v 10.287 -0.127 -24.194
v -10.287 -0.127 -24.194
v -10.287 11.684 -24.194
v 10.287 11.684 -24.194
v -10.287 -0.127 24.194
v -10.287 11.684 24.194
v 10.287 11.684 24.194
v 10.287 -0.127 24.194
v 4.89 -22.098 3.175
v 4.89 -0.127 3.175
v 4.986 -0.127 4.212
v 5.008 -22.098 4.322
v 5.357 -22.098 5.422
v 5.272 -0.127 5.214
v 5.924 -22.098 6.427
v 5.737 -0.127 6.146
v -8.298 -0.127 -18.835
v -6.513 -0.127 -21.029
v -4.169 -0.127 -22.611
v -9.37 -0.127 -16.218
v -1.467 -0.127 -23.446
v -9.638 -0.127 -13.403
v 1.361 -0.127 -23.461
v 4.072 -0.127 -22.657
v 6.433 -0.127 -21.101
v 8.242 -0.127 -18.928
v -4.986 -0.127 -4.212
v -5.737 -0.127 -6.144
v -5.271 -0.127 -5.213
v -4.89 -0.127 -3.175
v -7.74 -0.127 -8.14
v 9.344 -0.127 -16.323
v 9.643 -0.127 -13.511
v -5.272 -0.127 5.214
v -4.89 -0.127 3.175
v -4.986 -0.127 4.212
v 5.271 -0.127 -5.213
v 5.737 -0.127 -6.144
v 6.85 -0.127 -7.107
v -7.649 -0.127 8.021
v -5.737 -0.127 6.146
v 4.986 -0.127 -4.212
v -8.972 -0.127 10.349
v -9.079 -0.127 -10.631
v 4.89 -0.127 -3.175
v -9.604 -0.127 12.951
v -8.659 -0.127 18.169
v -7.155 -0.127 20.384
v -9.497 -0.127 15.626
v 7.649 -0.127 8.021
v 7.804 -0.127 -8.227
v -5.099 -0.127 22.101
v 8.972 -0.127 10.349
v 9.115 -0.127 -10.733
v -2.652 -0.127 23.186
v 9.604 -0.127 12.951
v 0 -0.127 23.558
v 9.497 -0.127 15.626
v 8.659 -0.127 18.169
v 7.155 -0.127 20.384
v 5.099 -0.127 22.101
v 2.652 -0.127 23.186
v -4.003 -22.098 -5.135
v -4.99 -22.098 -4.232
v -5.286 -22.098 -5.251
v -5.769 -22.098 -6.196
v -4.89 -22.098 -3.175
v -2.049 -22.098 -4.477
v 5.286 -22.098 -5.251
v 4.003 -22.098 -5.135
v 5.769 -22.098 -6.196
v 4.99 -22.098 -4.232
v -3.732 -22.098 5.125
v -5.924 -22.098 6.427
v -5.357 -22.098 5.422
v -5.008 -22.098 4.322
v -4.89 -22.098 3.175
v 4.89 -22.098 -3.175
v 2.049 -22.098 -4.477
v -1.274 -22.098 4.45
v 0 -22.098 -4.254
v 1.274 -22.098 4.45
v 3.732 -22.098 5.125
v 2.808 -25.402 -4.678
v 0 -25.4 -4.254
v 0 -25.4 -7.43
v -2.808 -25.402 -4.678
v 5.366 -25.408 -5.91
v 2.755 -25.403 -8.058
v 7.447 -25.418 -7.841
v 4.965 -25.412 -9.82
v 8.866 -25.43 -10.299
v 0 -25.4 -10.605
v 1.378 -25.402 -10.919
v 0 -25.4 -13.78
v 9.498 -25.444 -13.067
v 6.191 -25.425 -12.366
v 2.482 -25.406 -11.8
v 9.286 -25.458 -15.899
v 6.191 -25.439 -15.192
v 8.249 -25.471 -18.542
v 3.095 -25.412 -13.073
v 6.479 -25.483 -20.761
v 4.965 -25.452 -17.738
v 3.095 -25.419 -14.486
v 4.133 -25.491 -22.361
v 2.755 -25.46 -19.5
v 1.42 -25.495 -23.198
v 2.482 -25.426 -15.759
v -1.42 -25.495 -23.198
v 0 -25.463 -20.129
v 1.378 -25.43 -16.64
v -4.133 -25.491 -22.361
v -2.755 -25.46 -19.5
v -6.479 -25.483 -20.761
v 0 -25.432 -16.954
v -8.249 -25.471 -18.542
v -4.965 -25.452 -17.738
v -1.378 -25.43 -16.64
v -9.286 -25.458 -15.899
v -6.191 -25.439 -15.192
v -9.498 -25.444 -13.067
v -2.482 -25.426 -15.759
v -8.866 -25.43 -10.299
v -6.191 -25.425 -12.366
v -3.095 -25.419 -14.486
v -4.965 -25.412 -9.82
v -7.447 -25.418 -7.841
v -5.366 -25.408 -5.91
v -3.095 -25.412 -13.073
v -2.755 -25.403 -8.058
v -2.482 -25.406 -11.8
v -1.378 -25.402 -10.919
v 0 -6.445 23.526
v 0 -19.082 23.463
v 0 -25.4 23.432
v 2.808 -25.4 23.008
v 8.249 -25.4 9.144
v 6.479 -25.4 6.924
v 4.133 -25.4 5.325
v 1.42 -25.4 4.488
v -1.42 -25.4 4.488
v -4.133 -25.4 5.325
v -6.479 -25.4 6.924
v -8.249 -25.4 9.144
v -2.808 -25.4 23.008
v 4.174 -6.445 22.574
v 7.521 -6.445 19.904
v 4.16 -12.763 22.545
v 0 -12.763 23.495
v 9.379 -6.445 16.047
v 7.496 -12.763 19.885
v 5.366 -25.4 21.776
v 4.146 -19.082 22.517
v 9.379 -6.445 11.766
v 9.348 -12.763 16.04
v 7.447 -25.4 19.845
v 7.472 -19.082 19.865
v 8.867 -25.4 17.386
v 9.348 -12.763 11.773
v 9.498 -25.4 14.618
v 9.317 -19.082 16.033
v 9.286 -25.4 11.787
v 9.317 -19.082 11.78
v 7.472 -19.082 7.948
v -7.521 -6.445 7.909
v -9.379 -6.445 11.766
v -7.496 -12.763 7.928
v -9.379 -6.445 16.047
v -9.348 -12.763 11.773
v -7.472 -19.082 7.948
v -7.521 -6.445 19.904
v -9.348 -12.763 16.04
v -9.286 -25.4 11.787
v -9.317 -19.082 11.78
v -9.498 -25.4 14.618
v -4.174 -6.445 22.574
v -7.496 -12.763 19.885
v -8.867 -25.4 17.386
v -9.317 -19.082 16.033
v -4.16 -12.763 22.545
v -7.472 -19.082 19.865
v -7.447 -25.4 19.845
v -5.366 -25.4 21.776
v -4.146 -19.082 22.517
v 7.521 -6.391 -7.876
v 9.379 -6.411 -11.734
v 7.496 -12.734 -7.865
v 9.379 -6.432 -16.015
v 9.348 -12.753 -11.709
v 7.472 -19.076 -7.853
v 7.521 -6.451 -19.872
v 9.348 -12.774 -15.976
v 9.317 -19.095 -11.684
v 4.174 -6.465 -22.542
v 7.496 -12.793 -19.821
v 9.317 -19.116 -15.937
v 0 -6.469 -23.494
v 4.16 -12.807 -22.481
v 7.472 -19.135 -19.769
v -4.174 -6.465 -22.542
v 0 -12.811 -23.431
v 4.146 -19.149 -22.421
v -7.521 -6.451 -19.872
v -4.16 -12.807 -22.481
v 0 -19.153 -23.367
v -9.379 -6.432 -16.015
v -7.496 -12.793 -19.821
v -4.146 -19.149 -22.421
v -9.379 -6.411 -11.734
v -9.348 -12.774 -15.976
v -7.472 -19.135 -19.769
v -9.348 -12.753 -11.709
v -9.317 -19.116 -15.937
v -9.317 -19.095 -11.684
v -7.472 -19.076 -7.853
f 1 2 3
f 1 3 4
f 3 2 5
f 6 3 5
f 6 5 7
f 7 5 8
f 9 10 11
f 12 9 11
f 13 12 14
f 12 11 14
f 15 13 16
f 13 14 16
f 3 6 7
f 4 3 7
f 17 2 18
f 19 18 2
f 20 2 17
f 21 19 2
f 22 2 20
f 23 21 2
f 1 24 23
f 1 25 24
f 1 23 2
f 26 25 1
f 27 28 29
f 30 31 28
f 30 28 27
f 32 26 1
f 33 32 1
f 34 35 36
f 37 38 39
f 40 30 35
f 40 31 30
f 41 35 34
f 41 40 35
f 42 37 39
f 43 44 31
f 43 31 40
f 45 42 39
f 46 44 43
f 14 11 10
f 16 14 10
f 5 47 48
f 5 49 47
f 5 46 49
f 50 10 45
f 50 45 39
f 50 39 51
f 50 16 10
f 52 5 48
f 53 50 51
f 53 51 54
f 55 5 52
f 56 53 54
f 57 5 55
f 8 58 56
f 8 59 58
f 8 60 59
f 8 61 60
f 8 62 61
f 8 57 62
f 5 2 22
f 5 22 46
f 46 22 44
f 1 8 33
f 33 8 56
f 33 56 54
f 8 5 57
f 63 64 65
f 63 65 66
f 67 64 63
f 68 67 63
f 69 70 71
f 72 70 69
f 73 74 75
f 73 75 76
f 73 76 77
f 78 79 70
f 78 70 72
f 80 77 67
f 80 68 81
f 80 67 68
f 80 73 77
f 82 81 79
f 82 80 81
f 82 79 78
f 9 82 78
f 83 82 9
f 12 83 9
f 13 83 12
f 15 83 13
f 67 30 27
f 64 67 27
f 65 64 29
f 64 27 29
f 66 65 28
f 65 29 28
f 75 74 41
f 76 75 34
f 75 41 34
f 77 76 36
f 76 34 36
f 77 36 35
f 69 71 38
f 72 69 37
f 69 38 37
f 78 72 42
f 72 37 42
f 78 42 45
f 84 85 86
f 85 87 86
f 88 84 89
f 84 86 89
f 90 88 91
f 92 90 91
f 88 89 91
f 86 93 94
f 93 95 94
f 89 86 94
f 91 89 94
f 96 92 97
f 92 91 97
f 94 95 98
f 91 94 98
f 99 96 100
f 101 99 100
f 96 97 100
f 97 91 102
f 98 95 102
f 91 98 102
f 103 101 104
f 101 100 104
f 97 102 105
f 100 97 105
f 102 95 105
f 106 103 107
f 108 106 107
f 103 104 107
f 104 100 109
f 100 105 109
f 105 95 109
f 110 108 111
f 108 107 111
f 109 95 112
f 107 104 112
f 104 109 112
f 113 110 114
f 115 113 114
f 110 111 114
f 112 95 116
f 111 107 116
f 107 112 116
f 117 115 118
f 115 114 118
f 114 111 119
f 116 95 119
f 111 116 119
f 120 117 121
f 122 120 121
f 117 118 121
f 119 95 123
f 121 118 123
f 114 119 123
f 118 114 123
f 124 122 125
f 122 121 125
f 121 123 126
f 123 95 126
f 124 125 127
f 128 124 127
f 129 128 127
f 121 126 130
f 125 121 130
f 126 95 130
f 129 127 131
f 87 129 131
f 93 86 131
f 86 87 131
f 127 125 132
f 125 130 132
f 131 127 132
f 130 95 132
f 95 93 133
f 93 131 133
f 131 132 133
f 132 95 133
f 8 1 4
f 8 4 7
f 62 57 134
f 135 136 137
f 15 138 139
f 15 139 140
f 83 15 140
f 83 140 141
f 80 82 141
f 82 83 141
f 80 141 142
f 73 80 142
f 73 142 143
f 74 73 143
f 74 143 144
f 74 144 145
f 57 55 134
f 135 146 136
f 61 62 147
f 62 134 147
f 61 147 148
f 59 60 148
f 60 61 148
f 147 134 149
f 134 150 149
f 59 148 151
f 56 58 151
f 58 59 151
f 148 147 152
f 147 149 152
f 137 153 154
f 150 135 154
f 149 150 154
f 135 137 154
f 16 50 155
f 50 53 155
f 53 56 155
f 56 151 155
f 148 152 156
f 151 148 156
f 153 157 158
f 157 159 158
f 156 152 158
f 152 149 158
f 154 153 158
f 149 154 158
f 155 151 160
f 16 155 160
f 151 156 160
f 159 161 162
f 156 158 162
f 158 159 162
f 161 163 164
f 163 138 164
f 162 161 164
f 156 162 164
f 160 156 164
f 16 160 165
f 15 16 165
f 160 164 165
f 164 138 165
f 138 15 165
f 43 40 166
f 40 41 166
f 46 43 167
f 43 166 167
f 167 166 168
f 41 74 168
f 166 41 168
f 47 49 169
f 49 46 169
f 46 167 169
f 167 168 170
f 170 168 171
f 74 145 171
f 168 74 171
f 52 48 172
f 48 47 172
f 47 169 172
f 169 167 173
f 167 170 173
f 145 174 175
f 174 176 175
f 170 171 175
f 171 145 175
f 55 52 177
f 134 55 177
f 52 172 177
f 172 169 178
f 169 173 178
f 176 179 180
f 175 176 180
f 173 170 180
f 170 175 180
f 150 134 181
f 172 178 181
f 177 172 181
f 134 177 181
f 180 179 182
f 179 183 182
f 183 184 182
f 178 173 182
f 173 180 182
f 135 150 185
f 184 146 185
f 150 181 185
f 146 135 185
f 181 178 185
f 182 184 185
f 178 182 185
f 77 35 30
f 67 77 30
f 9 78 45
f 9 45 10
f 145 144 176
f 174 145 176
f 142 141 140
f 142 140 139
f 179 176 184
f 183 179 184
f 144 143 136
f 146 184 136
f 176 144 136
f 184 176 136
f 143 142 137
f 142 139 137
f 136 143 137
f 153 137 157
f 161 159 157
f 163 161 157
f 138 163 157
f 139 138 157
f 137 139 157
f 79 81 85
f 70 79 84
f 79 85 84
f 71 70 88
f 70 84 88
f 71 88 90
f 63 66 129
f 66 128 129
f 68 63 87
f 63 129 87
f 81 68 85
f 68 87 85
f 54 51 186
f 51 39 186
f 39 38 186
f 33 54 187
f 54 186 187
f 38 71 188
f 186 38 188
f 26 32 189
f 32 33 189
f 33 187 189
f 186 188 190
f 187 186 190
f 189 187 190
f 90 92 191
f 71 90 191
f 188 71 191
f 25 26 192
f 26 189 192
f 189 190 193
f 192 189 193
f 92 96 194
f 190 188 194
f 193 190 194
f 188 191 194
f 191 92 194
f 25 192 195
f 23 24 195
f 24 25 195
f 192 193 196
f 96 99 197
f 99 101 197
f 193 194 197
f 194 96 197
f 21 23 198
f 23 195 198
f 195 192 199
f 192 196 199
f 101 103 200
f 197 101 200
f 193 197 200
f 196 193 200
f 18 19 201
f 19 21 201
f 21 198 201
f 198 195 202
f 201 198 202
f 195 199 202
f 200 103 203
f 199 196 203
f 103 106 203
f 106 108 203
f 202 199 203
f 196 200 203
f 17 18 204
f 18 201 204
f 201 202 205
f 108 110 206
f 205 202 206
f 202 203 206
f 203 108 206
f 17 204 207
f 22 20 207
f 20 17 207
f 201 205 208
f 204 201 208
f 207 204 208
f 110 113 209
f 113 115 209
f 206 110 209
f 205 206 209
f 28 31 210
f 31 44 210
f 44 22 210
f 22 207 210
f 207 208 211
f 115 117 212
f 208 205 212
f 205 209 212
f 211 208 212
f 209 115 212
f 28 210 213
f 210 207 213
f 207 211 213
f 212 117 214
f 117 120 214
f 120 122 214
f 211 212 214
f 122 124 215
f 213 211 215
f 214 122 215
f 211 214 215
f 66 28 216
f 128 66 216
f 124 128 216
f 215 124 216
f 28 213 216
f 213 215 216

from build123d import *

# Parameters (mm, degrees)
F4_DEPTH = 22.098
F3_W     = 20.574
F3_H     = 48.387
F5_DEPTH = 0.127
F6_DEPTH = 11.557


with BuildPart() as f1:
    # F0 (on Right) → F1 (revolve)
    with BuildSketch(Plane.YZ):
        Polygon((-25.4, 23.4315), (-25.4, 13.9065), (0, 13.9065), (0, 23.5585), align=None)
    revolve(axis=Axis((0, -12.7, 13.9065), (0, 1, 0)))



with BuildPart() as f2:
    # F0 (on Right) → F2 (revolve)
    with BuildSketch(Plane.YZ):
        Polygon((0, -13.9065), (0, -4.2545), (-25.4, -4.2545), (-25.4, -13.7795), align=None)
    revolve(axis=Axis((0, -12.7, -13.843), (0, 0.9999875002, -0.0049999375)))


with BuildPart() as f1_1:
    add(f1.part)

    add(f2.part)  # F4 merges F2
    # F3 (on Front) → F4 (join)
    with BuildSketch(Plane.XZ):
        with BuildLine():
            Line((4.8895, -3.175), (4.8895, 3.175))
            ThreePointArc((4.8895, 3.175), (5.3288232031, 5.3549618496), (6.57820844, 7.1946017797))
            ThreePointArc((6.57820844, 7.1946017797), (0, 4.5085), (-6.57820844, 7.1946017797))
            ThreePointArc((-6.57820844, 7.1946017797), (-5.3288232031, 5.3549618496), (-4.8895, 3.175))
            Line((-4.8895, 3.175), (-4.8895, -3.175))
            ThreePointArc((-4.8895, -3.175), (-5.3287958737, -5.3547810515), (-6.5781006563, -7.1942548506))
            ThreePointArc((-6.5781006563, -7.1942548506), (0, -4.508258706), (6.5781006563, -7.1942548506))
            ThreePointArc((6.5781006563, -7.1942548506), (5.3287958737, -5.3547810515), (4.8895, -3.175))
        make_face()
    extrude(amount=F4_DEPTH)

    # F3 (on Front) → F5 (join, symmetric)
    with BuildSketch(Plane.XZ):
        Rectangle(F3_W, F3_H)
        with BuildLine():
            ThreePointArc((6.57820844, 7.1946017797), (5.3288232031, 5.3549618496), (4.8895, 3.175))
            Line((4.8895, 3.175), (4.8895, -3.175))
            ThreePointArc((4.8895, -3.175), (5.3287958737, -5.3547810515), (6.5781006563, -7.1942548506))
            ThreePointArc((6.5781006563, -7.1942548506), (8.6643924763, -10.2661066466), (9.398, -13.906258706))
            ThreePointArc((9.398, -13.906258706), (-3.6401520595, -22.5706511824), (-6.5781006563, -7.1942548506))
            ThreePointArc((-6.5781006563, -7.1942548506), (-5.3287958737, -5.3547810515), (-4.8895, -3.175))
            Line((-4.8895, -3.175), (-4.8895, 3.175))
            ThreePointArc((-4.8895, 3.175), (-5.3288232031, 5.3549618496), (-6.57820844, 7.1946017797))
            ThreePointArc((-6.57820844, 7.1946017797), (-3.6400824909, 22.5709217037), (9.398, 13.9065))
            ThreePointArc((9.398, 13.9065), (8.6644217037, 10.2664175091), (6.57820844, 7.1946017797))
        make_face(mode=Mode.SUBTRACT)
        with BuildLine():
            ThreePointArc((9.398, -13.906258706), (8.6643924763, -10.2661066466), (6.5781006563, -7.1942548506))
            ThreePointArc((6.5781006563, -7.1942548506), (0, -4.508258706), (-6.5781006563, -7.1942548506))
            ThreePointArc((-6.5781006563, -7.1942548506), (-3.6401520595, -22.5706511824), (9.398, -13.906258706))
        make_face()
        with BuildLine():
            Line((4.8895, -3.175), (4.8895, 3.175))
            ThreePointArc((4.8895, 3.175), (5.3288232031, 5.3549618496), (6.57820844, 7.1946017797))
            ThreePointArc((6.57820844, 7.1946017797), (0, 4.5085), (-6.57820844, 7.1946017797))
            ThreePointArc((-6.57820844, 7.1946017797), (-5.3288232031, 5.3549618496), (-4.8895, 3.175))
            Line((-4.8895, 3.175), (-4.8895, -3.175))
            ThreePointArc((-4.8895, -3.175), (-5.3287958737, -5.3547810515), (-6.5781006563, -7.1942548506))
            ThreePointArc((-6.5781006563, -7.1942548506), (0, -4.508258706), (6.5781006563, -7.1942548506))
            ThreePointArc((6.5781006563, -7.1942548506), (5.3287958737, -5.3547810515), (4.8895, -3.175))
        make_face()
        with BuildLine():
            ThreePointArc((-6.57820844, 7.1946017797), (0, 4.5085), (6.57820844, 7.1946017797))
            ThreePointArc((6.57820844, 7.1946017797), (8.6644217037, 10.2664175091), (9.398, 13.9065))
            ThreePointArc((9.398, 13.9065), (-3.6400824909, 22.5709217037), (-6.57820844, 7.1946017797))
        make_face()
    extrude(amount=F5_DEPTH, both=True)

    # F6 (add): a face of the model
    f6_faces = [f1_1.faces().sort_by_distance(p)[0] for p in [
        (0, 0.127, 0),
    ]]
    extrude(f6_faces, amount=F6_DEPTH)


solid = f1_1.part
